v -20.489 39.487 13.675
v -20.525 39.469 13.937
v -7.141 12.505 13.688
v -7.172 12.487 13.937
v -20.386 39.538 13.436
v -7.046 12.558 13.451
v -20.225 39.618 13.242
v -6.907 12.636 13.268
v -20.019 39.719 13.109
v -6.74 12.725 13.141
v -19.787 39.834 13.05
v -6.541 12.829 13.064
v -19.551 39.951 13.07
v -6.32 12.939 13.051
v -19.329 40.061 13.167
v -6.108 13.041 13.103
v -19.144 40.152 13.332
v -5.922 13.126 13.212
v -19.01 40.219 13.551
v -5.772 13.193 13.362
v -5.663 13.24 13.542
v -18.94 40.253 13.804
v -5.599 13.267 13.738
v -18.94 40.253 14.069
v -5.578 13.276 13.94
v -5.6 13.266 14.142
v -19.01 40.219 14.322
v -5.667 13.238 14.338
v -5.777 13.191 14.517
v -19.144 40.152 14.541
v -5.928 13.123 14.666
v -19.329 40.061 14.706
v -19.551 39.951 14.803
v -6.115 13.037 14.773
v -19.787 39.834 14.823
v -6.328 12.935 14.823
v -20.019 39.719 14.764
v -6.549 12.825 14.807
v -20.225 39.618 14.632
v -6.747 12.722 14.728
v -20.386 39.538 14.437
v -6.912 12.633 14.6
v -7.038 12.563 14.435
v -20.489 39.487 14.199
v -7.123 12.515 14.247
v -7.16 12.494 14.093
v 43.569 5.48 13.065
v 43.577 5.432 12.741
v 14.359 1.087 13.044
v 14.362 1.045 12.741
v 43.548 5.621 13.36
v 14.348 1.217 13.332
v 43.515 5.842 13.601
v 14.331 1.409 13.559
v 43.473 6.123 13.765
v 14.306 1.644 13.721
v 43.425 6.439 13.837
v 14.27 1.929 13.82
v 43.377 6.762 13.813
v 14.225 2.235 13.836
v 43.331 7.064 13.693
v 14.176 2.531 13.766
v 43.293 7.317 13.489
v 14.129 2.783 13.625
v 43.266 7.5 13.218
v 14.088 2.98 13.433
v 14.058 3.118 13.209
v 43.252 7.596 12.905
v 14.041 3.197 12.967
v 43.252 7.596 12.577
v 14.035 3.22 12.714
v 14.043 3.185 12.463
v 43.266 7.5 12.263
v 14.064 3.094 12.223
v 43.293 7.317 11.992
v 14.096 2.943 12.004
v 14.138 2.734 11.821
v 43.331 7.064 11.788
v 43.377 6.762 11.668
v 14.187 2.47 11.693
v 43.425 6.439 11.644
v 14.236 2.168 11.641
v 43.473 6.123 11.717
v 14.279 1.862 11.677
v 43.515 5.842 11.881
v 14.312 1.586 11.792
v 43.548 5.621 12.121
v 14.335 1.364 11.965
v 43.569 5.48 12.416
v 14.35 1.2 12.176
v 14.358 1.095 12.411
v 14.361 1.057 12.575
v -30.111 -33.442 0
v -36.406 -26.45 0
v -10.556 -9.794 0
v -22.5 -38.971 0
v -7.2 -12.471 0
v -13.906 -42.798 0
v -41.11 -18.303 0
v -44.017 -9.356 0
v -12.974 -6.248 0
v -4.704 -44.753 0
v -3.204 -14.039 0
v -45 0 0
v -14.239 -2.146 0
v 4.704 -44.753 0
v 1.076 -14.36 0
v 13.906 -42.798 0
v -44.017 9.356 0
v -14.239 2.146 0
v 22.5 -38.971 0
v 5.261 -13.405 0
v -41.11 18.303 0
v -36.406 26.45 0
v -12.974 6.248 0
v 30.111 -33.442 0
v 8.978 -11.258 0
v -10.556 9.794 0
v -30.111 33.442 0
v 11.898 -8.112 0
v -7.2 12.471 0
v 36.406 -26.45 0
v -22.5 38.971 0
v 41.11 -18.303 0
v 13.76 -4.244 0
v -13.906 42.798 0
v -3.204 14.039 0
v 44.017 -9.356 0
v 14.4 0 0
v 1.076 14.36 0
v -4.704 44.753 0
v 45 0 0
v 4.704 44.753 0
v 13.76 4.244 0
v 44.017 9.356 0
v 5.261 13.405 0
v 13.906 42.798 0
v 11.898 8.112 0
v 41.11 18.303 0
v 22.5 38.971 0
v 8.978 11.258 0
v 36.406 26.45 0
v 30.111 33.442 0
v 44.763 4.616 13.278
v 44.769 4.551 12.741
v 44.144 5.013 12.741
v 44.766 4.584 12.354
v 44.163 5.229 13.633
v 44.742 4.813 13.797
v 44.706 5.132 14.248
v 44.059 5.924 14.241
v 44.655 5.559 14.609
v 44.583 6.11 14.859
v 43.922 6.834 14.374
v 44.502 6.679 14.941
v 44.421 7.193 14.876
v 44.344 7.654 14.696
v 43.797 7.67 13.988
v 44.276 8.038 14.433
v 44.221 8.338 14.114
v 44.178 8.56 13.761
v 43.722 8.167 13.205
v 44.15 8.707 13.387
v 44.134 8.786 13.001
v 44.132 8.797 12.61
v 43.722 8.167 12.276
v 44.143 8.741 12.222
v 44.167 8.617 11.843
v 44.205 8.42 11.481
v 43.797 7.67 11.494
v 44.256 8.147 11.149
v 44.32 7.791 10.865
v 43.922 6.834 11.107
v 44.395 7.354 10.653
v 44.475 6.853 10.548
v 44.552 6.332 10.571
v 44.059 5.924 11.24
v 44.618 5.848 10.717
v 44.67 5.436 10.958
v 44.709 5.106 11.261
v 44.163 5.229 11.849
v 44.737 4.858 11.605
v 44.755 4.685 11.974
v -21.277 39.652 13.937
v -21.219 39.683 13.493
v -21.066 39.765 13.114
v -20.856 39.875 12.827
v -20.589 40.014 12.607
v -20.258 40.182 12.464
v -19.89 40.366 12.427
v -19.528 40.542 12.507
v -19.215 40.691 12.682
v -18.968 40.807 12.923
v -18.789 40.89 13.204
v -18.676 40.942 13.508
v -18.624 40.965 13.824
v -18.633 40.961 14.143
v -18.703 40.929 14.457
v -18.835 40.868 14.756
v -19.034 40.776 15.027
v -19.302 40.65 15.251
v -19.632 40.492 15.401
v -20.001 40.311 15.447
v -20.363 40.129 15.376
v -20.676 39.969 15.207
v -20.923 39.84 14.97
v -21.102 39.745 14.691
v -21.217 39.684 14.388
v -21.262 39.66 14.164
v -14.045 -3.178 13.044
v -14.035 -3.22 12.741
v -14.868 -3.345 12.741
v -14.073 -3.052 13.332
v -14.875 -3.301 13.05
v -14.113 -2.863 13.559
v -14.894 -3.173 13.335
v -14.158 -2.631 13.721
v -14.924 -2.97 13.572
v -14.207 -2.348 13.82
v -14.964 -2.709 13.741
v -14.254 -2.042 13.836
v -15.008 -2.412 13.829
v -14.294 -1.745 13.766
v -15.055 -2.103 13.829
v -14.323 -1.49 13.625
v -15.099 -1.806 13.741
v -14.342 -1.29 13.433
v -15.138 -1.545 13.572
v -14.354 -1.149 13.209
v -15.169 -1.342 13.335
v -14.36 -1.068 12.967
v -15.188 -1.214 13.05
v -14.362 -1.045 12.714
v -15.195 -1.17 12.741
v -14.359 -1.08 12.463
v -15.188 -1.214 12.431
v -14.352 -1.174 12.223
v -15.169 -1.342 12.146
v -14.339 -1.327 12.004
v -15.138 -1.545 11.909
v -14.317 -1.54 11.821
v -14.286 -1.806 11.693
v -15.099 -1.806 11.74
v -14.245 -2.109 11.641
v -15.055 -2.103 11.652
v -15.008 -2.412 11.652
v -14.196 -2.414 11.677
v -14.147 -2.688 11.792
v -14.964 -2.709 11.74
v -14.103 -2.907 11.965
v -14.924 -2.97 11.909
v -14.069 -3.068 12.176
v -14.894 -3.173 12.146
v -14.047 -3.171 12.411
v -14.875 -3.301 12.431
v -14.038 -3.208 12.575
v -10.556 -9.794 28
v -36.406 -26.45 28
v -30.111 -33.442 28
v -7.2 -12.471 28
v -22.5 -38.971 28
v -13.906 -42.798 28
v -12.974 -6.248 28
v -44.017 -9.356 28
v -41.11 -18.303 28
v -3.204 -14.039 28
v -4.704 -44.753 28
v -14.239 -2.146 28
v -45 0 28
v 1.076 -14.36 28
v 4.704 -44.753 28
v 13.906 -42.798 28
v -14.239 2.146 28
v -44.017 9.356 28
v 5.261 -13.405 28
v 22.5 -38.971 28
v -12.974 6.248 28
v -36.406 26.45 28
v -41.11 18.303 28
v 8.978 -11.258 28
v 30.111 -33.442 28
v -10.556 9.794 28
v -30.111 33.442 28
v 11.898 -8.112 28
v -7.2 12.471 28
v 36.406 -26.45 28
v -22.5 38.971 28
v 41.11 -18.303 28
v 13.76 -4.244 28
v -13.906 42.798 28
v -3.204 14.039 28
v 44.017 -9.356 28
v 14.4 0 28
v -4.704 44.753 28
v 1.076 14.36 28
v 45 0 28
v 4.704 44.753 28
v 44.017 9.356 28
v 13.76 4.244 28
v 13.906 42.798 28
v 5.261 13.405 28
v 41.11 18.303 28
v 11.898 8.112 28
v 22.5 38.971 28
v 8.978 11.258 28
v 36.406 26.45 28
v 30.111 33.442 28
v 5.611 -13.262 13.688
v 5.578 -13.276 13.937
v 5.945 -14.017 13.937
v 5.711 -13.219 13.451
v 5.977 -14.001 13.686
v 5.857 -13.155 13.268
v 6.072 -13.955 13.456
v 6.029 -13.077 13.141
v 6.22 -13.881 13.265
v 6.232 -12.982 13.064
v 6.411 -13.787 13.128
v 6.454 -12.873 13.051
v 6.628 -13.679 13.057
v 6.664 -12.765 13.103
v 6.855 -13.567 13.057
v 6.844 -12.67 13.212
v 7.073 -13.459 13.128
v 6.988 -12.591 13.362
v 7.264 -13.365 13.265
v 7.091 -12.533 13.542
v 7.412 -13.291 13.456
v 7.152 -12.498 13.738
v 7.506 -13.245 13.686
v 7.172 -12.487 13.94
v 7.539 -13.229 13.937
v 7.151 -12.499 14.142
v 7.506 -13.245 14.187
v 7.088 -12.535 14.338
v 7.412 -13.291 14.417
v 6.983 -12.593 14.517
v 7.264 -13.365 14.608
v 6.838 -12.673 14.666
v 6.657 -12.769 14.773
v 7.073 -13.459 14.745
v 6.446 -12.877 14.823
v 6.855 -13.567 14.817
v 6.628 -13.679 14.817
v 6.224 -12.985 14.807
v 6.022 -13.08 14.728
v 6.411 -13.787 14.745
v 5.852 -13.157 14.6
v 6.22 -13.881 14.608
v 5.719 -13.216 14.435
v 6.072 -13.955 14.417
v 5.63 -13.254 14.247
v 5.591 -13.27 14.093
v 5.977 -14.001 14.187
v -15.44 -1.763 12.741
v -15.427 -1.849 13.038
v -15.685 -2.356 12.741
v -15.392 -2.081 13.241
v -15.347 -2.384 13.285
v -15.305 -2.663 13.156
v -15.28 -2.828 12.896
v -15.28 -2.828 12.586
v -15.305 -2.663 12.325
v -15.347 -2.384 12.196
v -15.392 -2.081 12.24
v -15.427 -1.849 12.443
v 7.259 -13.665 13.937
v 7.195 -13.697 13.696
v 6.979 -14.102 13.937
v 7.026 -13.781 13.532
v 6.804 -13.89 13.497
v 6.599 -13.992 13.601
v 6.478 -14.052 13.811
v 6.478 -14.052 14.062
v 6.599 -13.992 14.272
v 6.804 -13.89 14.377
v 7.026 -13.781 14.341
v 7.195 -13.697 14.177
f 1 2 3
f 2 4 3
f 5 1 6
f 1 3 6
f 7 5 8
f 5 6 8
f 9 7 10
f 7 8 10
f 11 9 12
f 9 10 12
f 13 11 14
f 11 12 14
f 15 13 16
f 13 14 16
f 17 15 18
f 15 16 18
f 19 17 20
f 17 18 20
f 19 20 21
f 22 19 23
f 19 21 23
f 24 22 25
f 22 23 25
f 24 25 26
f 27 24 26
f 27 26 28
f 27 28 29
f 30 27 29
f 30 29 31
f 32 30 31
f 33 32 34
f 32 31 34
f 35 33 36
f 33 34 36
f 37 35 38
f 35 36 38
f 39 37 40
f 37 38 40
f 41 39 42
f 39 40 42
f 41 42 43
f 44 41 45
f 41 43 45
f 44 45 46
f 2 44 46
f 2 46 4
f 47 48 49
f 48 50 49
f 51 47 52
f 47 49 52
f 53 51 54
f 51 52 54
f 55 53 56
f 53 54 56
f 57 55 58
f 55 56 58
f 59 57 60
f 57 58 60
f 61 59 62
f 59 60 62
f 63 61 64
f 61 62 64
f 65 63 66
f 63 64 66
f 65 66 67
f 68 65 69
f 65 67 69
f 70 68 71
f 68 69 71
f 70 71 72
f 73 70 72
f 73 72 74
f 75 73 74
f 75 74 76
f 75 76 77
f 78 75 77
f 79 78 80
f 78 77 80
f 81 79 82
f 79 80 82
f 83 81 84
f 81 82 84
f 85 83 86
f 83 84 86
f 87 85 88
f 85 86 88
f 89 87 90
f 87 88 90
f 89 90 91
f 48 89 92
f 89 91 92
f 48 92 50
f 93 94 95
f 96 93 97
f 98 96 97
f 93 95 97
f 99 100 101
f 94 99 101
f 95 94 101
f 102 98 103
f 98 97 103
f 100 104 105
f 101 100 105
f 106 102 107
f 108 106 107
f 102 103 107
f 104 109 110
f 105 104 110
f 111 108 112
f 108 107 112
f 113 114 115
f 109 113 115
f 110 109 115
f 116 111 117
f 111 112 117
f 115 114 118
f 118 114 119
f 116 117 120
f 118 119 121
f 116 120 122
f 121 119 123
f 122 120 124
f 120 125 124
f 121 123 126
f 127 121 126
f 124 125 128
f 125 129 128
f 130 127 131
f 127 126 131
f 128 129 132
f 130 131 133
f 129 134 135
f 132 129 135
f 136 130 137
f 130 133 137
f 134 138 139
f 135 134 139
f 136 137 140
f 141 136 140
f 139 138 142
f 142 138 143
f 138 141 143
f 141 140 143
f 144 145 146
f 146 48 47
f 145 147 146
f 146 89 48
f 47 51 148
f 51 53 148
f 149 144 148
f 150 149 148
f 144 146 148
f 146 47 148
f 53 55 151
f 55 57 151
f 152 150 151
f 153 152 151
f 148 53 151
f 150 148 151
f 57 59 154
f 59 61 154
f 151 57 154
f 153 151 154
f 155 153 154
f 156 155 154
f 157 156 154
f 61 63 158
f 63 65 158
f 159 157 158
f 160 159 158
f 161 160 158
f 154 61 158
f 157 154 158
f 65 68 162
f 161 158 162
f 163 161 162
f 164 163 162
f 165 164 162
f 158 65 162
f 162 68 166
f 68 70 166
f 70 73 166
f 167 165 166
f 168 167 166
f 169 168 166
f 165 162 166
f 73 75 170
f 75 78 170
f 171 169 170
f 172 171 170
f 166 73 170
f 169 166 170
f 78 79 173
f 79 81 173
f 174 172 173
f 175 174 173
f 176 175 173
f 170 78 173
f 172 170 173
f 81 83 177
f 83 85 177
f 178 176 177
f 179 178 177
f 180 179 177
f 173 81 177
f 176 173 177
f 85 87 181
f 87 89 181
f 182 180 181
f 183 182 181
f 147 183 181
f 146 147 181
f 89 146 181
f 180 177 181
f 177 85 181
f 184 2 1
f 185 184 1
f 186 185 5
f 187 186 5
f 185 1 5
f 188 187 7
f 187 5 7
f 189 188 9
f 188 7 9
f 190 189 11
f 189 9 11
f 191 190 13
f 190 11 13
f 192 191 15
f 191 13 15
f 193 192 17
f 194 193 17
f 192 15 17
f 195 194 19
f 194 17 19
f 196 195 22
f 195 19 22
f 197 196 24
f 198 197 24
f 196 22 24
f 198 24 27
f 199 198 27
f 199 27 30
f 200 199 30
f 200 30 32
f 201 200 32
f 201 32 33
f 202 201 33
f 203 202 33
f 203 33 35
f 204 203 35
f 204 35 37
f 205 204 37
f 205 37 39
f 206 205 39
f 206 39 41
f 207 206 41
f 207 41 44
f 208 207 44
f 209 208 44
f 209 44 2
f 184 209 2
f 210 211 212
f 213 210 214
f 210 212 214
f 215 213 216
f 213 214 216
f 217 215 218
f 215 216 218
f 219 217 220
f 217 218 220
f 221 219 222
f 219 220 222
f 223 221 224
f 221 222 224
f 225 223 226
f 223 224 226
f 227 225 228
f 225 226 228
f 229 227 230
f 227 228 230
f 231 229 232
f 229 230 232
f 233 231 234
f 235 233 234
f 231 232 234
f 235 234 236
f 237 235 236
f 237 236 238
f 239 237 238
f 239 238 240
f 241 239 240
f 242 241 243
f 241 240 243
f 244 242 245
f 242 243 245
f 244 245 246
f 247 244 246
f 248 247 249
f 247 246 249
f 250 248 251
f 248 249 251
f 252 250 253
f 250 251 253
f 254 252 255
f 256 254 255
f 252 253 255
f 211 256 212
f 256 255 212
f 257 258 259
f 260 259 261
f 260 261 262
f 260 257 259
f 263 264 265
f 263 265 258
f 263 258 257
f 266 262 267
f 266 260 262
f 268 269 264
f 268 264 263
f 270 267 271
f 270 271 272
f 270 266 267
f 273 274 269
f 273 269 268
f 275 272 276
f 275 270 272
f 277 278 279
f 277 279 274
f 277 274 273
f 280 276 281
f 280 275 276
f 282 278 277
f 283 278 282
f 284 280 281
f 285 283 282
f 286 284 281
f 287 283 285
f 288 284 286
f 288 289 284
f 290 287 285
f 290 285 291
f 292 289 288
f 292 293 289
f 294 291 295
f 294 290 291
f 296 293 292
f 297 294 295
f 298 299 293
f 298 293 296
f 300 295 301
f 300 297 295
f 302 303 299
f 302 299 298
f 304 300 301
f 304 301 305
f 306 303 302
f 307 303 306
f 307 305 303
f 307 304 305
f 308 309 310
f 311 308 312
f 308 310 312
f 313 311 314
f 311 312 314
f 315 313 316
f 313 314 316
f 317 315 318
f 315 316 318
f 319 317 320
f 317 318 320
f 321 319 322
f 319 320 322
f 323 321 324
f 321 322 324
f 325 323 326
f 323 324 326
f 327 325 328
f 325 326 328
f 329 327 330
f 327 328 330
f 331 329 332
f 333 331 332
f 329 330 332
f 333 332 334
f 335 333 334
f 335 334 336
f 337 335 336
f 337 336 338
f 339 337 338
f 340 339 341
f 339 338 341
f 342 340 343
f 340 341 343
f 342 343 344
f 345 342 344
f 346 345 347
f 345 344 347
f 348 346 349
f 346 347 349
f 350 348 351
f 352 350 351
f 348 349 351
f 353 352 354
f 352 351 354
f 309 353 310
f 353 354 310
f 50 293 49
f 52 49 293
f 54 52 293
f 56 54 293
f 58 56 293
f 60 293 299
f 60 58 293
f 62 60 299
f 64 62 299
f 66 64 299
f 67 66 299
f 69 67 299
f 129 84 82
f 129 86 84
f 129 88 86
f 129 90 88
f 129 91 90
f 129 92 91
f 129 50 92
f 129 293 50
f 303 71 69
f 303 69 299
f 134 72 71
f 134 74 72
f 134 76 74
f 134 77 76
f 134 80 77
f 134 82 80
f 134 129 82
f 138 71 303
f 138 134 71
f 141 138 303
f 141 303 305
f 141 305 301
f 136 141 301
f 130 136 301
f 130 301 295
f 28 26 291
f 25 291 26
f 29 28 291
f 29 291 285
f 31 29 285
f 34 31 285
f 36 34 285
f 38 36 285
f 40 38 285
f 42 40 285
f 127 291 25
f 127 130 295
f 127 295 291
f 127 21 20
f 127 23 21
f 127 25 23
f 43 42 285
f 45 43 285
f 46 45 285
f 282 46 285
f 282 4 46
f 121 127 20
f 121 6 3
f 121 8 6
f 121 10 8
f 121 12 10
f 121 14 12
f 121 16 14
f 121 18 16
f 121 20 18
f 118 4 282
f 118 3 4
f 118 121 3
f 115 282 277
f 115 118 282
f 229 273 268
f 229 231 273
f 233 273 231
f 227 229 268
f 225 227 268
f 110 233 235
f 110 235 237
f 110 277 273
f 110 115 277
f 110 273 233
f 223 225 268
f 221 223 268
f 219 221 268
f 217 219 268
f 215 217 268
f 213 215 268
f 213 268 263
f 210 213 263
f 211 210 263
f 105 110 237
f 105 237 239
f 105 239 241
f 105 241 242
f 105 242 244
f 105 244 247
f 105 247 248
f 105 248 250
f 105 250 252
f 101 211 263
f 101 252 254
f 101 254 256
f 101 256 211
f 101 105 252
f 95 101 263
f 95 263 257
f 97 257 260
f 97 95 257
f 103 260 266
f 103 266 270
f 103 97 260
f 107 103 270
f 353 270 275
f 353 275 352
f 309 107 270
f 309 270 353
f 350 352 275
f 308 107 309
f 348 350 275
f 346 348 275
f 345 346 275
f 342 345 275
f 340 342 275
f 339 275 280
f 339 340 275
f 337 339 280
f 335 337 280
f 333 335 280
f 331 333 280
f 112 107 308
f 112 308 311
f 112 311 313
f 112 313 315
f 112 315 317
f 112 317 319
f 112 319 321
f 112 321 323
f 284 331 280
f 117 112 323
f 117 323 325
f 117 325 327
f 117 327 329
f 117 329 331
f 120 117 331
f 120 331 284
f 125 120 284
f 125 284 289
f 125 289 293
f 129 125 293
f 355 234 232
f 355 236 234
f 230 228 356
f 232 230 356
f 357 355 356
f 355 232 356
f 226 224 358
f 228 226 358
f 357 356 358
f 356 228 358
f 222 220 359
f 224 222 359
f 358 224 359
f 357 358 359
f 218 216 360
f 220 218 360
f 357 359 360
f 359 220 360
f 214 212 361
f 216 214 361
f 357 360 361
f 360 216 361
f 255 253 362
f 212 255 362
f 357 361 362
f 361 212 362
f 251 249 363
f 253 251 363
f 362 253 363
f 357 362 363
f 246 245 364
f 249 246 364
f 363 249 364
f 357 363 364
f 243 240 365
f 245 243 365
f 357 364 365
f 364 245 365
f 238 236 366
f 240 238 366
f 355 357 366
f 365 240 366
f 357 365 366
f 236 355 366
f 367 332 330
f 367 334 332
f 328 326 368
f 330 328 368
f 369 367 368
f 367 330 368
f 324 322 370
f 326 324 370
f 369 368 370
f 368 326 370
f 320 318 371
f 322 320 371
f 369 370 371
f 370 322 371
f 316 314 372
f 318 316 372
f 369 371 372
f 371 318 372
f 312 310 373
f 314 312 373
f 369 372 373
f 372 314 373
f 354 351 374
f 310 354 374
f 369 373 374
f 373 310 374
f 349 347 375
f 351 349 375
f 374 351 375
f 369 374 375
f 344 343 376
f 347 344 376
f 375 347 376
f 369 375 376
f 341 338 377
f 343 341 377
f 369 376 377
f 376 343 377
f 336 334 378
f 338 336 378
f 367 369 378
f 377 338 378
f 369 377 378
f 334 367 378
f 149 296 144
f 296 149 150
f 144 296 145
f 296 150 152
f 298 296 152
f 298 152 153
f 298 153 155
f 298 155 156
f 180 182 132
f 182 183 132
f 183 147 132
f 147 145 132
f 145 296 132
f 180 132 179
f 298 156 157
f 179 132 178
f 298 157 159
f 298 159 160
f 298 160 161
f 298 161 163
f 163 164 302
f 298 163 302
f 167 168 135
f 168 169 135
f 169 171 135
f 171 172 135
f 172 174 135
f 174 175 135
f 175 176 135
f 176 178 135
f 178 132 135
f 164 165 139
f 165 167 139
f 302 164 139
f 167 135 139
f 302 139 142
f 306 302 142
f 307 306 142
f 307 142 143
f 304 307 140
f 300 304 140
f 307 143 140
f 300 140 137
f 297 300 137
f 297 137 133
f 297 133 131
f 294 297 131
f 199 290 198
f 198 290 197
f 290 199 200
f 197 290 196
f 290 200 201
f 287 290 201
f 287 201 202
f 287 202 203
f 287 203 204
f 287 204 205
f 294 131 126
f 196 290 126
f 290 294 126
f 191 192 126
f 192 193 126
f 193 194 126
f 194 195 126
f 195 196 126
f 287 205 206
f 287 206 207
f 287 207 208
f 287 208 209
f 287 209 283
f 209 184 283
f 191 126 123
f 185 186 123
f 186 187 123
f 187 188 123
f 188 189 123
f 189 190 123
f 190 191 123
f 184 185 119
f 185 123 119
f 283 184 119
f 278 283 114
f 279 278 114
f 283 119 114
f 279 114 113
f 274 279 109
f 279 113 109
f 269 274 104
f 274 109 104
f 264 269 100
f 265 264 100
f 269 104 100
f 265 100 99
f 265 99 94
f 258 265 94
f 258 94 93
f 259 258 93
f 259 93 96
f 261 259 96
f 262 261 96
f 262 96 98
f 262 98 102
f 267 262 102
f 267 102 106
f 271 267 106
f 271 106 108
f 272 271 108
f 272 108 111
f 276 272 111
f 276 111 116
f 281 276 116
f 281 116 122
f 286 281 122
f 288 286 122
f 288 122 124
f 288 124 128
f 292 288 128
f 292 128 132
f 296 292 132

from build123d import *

# Parameters (mm, degrees)
SKETCH2_R                                         = 45
SKETCH2_R_2                                       = 14.4
BOSS_EXTRUDE1_DEPTH                               = 28
CSK_FOR_M2_FLAT_HEAD_MACHINE_SCREW2_D             = 2.2
CSK_FOR_M2_FLAT_HEAD_MACHINE_SCREW2_DEPTH         = 60.2
CSK_FOR_M2_FLAT_HEAD_MACHINE_SCREW2_CSINK_D       = 4.4
CSK_FOR_M2_FLAT_HEAD_MACHINE_SCREW2_CSINK_ANGLE   = 90
CSK_FOR_M2_FLAT_HEAD_MACHINE_SCREW2_TIP           = 0.660946681
CSK_FOR_0_FLAT_HEAD_MACHINE_SCREW_100_D           = 1.778
CSK_FOR_0_FLAT_HEAD_MACHINE_SCREW_100_DEPTH       = 60.2
CSK_FOR_0_FLAT_HEAD_MACHINE_SCREW_100_CSINK_D     = 3.0226
CSK_FOR_0_FLAT_HEAD_MACHINE_SCREW_100_CSINK_ANGLE = 100
CSK_FOR_0_FLAT_HEAD_MACHINE_SCREW_100_TIP         = 0.53416509


with BuildPart() as part:
    # Sketch2 → Boss-Extrude1 (new body)
    with BuildSketch(Plane.XY):
        Circle(SKETCH2_R)
        Circle(SKETCH2_R_2, mode=Mode.SUBTRACT)
    extrude(amount=BOSS_EXTRUDE1_DEPTH)

    # CSK for M2 Flat Head Machine Screw2
    with Locations(Plane(origin=(44.500938933, 6.683295151, 12.740574547), x_dir=(-0.148517670011, 0.98890975407, 0), z_dir=(0.98890975407, 0.148517670011, 0))):
        with Locations((-1e-09, 0)):
            CounterSinkHole(CSK_FOR_M2_FLAT_HEAD_MACHINE_SCREW2_D / 2, CSK_FOR_M2_FLAT_HEAD_MACHINE_SCREW2_CSINK_D / 2, depth=CSK_FOR_M2_FLAT_HEAD_MACHINE_SCREW2_DEPTH, counter_sink_angle=CSK_FOR_M2_FLAT_HEAD_MACHINE_SCREW2_CSINK_ANGLE)
            with Locations((0, 0, -(CSK_FOR_M2_FLAT_HEAD_MACHINE_SCREW2_DEPTH + CSK_FOR_M2_FLAT_HEAD_MACHINE_SCREW2_TIP / 2))):  # 118° drill point
                Cone(0, CSK_FOR_M2_FLAT_HEAD_MACHINE_SCREW2_D / 2, CSK_FOR_M2_FLAT_HEAD_MACHINE_SCREW2_TIP, mode=Mode.SUBTRACT)

    # CSK for #0 Flat Head Machine Screw (100)1
    with Locations(Plane(origin=(-19.959479504, 40.331367172, 13.936569292), x_dir=(0.896252603816, 0.443543988972, 0), z_dir=(-0.443543988972, 0.896252603816, 0))):
        with Locations((0, 0)):
            CounterSinkHole(CSK_FOR_0_FLAT_HEAD_MACHINE_SCREW_100_D / 2, CSK_FOR_0_FLAT_HEAD_MACHINE_SCREW_100_CSINK_D / 2, depth=CSK_FOR_0_FLAT_HEAD_MACHINE_SCREW_100_DEPTH, counter_sink_angle=CSK_FOR_0_FLAT_HEAD_MACHINE_SCREW_100_CSINK_ANGLE)
            with Locations((0, 0, -(CSK_FOR_0_FLAT_HEAD_MACHINE_SCREW_100_DEPTH + CSK_FOR_0_FLAT_HEAD_MACHINE_SCREW_100_TIP / 2))):  # 118° drill point
                Cone(0, CSK_FOR_0_FLAT_HEAD_MACHINE_SCREW_100_D / 2, CSK_FOR_0_FLAT_HEAD_MACHINE_SCREW_100_TIP, mode=Mode.SUBTRACT)


solid = part.part
